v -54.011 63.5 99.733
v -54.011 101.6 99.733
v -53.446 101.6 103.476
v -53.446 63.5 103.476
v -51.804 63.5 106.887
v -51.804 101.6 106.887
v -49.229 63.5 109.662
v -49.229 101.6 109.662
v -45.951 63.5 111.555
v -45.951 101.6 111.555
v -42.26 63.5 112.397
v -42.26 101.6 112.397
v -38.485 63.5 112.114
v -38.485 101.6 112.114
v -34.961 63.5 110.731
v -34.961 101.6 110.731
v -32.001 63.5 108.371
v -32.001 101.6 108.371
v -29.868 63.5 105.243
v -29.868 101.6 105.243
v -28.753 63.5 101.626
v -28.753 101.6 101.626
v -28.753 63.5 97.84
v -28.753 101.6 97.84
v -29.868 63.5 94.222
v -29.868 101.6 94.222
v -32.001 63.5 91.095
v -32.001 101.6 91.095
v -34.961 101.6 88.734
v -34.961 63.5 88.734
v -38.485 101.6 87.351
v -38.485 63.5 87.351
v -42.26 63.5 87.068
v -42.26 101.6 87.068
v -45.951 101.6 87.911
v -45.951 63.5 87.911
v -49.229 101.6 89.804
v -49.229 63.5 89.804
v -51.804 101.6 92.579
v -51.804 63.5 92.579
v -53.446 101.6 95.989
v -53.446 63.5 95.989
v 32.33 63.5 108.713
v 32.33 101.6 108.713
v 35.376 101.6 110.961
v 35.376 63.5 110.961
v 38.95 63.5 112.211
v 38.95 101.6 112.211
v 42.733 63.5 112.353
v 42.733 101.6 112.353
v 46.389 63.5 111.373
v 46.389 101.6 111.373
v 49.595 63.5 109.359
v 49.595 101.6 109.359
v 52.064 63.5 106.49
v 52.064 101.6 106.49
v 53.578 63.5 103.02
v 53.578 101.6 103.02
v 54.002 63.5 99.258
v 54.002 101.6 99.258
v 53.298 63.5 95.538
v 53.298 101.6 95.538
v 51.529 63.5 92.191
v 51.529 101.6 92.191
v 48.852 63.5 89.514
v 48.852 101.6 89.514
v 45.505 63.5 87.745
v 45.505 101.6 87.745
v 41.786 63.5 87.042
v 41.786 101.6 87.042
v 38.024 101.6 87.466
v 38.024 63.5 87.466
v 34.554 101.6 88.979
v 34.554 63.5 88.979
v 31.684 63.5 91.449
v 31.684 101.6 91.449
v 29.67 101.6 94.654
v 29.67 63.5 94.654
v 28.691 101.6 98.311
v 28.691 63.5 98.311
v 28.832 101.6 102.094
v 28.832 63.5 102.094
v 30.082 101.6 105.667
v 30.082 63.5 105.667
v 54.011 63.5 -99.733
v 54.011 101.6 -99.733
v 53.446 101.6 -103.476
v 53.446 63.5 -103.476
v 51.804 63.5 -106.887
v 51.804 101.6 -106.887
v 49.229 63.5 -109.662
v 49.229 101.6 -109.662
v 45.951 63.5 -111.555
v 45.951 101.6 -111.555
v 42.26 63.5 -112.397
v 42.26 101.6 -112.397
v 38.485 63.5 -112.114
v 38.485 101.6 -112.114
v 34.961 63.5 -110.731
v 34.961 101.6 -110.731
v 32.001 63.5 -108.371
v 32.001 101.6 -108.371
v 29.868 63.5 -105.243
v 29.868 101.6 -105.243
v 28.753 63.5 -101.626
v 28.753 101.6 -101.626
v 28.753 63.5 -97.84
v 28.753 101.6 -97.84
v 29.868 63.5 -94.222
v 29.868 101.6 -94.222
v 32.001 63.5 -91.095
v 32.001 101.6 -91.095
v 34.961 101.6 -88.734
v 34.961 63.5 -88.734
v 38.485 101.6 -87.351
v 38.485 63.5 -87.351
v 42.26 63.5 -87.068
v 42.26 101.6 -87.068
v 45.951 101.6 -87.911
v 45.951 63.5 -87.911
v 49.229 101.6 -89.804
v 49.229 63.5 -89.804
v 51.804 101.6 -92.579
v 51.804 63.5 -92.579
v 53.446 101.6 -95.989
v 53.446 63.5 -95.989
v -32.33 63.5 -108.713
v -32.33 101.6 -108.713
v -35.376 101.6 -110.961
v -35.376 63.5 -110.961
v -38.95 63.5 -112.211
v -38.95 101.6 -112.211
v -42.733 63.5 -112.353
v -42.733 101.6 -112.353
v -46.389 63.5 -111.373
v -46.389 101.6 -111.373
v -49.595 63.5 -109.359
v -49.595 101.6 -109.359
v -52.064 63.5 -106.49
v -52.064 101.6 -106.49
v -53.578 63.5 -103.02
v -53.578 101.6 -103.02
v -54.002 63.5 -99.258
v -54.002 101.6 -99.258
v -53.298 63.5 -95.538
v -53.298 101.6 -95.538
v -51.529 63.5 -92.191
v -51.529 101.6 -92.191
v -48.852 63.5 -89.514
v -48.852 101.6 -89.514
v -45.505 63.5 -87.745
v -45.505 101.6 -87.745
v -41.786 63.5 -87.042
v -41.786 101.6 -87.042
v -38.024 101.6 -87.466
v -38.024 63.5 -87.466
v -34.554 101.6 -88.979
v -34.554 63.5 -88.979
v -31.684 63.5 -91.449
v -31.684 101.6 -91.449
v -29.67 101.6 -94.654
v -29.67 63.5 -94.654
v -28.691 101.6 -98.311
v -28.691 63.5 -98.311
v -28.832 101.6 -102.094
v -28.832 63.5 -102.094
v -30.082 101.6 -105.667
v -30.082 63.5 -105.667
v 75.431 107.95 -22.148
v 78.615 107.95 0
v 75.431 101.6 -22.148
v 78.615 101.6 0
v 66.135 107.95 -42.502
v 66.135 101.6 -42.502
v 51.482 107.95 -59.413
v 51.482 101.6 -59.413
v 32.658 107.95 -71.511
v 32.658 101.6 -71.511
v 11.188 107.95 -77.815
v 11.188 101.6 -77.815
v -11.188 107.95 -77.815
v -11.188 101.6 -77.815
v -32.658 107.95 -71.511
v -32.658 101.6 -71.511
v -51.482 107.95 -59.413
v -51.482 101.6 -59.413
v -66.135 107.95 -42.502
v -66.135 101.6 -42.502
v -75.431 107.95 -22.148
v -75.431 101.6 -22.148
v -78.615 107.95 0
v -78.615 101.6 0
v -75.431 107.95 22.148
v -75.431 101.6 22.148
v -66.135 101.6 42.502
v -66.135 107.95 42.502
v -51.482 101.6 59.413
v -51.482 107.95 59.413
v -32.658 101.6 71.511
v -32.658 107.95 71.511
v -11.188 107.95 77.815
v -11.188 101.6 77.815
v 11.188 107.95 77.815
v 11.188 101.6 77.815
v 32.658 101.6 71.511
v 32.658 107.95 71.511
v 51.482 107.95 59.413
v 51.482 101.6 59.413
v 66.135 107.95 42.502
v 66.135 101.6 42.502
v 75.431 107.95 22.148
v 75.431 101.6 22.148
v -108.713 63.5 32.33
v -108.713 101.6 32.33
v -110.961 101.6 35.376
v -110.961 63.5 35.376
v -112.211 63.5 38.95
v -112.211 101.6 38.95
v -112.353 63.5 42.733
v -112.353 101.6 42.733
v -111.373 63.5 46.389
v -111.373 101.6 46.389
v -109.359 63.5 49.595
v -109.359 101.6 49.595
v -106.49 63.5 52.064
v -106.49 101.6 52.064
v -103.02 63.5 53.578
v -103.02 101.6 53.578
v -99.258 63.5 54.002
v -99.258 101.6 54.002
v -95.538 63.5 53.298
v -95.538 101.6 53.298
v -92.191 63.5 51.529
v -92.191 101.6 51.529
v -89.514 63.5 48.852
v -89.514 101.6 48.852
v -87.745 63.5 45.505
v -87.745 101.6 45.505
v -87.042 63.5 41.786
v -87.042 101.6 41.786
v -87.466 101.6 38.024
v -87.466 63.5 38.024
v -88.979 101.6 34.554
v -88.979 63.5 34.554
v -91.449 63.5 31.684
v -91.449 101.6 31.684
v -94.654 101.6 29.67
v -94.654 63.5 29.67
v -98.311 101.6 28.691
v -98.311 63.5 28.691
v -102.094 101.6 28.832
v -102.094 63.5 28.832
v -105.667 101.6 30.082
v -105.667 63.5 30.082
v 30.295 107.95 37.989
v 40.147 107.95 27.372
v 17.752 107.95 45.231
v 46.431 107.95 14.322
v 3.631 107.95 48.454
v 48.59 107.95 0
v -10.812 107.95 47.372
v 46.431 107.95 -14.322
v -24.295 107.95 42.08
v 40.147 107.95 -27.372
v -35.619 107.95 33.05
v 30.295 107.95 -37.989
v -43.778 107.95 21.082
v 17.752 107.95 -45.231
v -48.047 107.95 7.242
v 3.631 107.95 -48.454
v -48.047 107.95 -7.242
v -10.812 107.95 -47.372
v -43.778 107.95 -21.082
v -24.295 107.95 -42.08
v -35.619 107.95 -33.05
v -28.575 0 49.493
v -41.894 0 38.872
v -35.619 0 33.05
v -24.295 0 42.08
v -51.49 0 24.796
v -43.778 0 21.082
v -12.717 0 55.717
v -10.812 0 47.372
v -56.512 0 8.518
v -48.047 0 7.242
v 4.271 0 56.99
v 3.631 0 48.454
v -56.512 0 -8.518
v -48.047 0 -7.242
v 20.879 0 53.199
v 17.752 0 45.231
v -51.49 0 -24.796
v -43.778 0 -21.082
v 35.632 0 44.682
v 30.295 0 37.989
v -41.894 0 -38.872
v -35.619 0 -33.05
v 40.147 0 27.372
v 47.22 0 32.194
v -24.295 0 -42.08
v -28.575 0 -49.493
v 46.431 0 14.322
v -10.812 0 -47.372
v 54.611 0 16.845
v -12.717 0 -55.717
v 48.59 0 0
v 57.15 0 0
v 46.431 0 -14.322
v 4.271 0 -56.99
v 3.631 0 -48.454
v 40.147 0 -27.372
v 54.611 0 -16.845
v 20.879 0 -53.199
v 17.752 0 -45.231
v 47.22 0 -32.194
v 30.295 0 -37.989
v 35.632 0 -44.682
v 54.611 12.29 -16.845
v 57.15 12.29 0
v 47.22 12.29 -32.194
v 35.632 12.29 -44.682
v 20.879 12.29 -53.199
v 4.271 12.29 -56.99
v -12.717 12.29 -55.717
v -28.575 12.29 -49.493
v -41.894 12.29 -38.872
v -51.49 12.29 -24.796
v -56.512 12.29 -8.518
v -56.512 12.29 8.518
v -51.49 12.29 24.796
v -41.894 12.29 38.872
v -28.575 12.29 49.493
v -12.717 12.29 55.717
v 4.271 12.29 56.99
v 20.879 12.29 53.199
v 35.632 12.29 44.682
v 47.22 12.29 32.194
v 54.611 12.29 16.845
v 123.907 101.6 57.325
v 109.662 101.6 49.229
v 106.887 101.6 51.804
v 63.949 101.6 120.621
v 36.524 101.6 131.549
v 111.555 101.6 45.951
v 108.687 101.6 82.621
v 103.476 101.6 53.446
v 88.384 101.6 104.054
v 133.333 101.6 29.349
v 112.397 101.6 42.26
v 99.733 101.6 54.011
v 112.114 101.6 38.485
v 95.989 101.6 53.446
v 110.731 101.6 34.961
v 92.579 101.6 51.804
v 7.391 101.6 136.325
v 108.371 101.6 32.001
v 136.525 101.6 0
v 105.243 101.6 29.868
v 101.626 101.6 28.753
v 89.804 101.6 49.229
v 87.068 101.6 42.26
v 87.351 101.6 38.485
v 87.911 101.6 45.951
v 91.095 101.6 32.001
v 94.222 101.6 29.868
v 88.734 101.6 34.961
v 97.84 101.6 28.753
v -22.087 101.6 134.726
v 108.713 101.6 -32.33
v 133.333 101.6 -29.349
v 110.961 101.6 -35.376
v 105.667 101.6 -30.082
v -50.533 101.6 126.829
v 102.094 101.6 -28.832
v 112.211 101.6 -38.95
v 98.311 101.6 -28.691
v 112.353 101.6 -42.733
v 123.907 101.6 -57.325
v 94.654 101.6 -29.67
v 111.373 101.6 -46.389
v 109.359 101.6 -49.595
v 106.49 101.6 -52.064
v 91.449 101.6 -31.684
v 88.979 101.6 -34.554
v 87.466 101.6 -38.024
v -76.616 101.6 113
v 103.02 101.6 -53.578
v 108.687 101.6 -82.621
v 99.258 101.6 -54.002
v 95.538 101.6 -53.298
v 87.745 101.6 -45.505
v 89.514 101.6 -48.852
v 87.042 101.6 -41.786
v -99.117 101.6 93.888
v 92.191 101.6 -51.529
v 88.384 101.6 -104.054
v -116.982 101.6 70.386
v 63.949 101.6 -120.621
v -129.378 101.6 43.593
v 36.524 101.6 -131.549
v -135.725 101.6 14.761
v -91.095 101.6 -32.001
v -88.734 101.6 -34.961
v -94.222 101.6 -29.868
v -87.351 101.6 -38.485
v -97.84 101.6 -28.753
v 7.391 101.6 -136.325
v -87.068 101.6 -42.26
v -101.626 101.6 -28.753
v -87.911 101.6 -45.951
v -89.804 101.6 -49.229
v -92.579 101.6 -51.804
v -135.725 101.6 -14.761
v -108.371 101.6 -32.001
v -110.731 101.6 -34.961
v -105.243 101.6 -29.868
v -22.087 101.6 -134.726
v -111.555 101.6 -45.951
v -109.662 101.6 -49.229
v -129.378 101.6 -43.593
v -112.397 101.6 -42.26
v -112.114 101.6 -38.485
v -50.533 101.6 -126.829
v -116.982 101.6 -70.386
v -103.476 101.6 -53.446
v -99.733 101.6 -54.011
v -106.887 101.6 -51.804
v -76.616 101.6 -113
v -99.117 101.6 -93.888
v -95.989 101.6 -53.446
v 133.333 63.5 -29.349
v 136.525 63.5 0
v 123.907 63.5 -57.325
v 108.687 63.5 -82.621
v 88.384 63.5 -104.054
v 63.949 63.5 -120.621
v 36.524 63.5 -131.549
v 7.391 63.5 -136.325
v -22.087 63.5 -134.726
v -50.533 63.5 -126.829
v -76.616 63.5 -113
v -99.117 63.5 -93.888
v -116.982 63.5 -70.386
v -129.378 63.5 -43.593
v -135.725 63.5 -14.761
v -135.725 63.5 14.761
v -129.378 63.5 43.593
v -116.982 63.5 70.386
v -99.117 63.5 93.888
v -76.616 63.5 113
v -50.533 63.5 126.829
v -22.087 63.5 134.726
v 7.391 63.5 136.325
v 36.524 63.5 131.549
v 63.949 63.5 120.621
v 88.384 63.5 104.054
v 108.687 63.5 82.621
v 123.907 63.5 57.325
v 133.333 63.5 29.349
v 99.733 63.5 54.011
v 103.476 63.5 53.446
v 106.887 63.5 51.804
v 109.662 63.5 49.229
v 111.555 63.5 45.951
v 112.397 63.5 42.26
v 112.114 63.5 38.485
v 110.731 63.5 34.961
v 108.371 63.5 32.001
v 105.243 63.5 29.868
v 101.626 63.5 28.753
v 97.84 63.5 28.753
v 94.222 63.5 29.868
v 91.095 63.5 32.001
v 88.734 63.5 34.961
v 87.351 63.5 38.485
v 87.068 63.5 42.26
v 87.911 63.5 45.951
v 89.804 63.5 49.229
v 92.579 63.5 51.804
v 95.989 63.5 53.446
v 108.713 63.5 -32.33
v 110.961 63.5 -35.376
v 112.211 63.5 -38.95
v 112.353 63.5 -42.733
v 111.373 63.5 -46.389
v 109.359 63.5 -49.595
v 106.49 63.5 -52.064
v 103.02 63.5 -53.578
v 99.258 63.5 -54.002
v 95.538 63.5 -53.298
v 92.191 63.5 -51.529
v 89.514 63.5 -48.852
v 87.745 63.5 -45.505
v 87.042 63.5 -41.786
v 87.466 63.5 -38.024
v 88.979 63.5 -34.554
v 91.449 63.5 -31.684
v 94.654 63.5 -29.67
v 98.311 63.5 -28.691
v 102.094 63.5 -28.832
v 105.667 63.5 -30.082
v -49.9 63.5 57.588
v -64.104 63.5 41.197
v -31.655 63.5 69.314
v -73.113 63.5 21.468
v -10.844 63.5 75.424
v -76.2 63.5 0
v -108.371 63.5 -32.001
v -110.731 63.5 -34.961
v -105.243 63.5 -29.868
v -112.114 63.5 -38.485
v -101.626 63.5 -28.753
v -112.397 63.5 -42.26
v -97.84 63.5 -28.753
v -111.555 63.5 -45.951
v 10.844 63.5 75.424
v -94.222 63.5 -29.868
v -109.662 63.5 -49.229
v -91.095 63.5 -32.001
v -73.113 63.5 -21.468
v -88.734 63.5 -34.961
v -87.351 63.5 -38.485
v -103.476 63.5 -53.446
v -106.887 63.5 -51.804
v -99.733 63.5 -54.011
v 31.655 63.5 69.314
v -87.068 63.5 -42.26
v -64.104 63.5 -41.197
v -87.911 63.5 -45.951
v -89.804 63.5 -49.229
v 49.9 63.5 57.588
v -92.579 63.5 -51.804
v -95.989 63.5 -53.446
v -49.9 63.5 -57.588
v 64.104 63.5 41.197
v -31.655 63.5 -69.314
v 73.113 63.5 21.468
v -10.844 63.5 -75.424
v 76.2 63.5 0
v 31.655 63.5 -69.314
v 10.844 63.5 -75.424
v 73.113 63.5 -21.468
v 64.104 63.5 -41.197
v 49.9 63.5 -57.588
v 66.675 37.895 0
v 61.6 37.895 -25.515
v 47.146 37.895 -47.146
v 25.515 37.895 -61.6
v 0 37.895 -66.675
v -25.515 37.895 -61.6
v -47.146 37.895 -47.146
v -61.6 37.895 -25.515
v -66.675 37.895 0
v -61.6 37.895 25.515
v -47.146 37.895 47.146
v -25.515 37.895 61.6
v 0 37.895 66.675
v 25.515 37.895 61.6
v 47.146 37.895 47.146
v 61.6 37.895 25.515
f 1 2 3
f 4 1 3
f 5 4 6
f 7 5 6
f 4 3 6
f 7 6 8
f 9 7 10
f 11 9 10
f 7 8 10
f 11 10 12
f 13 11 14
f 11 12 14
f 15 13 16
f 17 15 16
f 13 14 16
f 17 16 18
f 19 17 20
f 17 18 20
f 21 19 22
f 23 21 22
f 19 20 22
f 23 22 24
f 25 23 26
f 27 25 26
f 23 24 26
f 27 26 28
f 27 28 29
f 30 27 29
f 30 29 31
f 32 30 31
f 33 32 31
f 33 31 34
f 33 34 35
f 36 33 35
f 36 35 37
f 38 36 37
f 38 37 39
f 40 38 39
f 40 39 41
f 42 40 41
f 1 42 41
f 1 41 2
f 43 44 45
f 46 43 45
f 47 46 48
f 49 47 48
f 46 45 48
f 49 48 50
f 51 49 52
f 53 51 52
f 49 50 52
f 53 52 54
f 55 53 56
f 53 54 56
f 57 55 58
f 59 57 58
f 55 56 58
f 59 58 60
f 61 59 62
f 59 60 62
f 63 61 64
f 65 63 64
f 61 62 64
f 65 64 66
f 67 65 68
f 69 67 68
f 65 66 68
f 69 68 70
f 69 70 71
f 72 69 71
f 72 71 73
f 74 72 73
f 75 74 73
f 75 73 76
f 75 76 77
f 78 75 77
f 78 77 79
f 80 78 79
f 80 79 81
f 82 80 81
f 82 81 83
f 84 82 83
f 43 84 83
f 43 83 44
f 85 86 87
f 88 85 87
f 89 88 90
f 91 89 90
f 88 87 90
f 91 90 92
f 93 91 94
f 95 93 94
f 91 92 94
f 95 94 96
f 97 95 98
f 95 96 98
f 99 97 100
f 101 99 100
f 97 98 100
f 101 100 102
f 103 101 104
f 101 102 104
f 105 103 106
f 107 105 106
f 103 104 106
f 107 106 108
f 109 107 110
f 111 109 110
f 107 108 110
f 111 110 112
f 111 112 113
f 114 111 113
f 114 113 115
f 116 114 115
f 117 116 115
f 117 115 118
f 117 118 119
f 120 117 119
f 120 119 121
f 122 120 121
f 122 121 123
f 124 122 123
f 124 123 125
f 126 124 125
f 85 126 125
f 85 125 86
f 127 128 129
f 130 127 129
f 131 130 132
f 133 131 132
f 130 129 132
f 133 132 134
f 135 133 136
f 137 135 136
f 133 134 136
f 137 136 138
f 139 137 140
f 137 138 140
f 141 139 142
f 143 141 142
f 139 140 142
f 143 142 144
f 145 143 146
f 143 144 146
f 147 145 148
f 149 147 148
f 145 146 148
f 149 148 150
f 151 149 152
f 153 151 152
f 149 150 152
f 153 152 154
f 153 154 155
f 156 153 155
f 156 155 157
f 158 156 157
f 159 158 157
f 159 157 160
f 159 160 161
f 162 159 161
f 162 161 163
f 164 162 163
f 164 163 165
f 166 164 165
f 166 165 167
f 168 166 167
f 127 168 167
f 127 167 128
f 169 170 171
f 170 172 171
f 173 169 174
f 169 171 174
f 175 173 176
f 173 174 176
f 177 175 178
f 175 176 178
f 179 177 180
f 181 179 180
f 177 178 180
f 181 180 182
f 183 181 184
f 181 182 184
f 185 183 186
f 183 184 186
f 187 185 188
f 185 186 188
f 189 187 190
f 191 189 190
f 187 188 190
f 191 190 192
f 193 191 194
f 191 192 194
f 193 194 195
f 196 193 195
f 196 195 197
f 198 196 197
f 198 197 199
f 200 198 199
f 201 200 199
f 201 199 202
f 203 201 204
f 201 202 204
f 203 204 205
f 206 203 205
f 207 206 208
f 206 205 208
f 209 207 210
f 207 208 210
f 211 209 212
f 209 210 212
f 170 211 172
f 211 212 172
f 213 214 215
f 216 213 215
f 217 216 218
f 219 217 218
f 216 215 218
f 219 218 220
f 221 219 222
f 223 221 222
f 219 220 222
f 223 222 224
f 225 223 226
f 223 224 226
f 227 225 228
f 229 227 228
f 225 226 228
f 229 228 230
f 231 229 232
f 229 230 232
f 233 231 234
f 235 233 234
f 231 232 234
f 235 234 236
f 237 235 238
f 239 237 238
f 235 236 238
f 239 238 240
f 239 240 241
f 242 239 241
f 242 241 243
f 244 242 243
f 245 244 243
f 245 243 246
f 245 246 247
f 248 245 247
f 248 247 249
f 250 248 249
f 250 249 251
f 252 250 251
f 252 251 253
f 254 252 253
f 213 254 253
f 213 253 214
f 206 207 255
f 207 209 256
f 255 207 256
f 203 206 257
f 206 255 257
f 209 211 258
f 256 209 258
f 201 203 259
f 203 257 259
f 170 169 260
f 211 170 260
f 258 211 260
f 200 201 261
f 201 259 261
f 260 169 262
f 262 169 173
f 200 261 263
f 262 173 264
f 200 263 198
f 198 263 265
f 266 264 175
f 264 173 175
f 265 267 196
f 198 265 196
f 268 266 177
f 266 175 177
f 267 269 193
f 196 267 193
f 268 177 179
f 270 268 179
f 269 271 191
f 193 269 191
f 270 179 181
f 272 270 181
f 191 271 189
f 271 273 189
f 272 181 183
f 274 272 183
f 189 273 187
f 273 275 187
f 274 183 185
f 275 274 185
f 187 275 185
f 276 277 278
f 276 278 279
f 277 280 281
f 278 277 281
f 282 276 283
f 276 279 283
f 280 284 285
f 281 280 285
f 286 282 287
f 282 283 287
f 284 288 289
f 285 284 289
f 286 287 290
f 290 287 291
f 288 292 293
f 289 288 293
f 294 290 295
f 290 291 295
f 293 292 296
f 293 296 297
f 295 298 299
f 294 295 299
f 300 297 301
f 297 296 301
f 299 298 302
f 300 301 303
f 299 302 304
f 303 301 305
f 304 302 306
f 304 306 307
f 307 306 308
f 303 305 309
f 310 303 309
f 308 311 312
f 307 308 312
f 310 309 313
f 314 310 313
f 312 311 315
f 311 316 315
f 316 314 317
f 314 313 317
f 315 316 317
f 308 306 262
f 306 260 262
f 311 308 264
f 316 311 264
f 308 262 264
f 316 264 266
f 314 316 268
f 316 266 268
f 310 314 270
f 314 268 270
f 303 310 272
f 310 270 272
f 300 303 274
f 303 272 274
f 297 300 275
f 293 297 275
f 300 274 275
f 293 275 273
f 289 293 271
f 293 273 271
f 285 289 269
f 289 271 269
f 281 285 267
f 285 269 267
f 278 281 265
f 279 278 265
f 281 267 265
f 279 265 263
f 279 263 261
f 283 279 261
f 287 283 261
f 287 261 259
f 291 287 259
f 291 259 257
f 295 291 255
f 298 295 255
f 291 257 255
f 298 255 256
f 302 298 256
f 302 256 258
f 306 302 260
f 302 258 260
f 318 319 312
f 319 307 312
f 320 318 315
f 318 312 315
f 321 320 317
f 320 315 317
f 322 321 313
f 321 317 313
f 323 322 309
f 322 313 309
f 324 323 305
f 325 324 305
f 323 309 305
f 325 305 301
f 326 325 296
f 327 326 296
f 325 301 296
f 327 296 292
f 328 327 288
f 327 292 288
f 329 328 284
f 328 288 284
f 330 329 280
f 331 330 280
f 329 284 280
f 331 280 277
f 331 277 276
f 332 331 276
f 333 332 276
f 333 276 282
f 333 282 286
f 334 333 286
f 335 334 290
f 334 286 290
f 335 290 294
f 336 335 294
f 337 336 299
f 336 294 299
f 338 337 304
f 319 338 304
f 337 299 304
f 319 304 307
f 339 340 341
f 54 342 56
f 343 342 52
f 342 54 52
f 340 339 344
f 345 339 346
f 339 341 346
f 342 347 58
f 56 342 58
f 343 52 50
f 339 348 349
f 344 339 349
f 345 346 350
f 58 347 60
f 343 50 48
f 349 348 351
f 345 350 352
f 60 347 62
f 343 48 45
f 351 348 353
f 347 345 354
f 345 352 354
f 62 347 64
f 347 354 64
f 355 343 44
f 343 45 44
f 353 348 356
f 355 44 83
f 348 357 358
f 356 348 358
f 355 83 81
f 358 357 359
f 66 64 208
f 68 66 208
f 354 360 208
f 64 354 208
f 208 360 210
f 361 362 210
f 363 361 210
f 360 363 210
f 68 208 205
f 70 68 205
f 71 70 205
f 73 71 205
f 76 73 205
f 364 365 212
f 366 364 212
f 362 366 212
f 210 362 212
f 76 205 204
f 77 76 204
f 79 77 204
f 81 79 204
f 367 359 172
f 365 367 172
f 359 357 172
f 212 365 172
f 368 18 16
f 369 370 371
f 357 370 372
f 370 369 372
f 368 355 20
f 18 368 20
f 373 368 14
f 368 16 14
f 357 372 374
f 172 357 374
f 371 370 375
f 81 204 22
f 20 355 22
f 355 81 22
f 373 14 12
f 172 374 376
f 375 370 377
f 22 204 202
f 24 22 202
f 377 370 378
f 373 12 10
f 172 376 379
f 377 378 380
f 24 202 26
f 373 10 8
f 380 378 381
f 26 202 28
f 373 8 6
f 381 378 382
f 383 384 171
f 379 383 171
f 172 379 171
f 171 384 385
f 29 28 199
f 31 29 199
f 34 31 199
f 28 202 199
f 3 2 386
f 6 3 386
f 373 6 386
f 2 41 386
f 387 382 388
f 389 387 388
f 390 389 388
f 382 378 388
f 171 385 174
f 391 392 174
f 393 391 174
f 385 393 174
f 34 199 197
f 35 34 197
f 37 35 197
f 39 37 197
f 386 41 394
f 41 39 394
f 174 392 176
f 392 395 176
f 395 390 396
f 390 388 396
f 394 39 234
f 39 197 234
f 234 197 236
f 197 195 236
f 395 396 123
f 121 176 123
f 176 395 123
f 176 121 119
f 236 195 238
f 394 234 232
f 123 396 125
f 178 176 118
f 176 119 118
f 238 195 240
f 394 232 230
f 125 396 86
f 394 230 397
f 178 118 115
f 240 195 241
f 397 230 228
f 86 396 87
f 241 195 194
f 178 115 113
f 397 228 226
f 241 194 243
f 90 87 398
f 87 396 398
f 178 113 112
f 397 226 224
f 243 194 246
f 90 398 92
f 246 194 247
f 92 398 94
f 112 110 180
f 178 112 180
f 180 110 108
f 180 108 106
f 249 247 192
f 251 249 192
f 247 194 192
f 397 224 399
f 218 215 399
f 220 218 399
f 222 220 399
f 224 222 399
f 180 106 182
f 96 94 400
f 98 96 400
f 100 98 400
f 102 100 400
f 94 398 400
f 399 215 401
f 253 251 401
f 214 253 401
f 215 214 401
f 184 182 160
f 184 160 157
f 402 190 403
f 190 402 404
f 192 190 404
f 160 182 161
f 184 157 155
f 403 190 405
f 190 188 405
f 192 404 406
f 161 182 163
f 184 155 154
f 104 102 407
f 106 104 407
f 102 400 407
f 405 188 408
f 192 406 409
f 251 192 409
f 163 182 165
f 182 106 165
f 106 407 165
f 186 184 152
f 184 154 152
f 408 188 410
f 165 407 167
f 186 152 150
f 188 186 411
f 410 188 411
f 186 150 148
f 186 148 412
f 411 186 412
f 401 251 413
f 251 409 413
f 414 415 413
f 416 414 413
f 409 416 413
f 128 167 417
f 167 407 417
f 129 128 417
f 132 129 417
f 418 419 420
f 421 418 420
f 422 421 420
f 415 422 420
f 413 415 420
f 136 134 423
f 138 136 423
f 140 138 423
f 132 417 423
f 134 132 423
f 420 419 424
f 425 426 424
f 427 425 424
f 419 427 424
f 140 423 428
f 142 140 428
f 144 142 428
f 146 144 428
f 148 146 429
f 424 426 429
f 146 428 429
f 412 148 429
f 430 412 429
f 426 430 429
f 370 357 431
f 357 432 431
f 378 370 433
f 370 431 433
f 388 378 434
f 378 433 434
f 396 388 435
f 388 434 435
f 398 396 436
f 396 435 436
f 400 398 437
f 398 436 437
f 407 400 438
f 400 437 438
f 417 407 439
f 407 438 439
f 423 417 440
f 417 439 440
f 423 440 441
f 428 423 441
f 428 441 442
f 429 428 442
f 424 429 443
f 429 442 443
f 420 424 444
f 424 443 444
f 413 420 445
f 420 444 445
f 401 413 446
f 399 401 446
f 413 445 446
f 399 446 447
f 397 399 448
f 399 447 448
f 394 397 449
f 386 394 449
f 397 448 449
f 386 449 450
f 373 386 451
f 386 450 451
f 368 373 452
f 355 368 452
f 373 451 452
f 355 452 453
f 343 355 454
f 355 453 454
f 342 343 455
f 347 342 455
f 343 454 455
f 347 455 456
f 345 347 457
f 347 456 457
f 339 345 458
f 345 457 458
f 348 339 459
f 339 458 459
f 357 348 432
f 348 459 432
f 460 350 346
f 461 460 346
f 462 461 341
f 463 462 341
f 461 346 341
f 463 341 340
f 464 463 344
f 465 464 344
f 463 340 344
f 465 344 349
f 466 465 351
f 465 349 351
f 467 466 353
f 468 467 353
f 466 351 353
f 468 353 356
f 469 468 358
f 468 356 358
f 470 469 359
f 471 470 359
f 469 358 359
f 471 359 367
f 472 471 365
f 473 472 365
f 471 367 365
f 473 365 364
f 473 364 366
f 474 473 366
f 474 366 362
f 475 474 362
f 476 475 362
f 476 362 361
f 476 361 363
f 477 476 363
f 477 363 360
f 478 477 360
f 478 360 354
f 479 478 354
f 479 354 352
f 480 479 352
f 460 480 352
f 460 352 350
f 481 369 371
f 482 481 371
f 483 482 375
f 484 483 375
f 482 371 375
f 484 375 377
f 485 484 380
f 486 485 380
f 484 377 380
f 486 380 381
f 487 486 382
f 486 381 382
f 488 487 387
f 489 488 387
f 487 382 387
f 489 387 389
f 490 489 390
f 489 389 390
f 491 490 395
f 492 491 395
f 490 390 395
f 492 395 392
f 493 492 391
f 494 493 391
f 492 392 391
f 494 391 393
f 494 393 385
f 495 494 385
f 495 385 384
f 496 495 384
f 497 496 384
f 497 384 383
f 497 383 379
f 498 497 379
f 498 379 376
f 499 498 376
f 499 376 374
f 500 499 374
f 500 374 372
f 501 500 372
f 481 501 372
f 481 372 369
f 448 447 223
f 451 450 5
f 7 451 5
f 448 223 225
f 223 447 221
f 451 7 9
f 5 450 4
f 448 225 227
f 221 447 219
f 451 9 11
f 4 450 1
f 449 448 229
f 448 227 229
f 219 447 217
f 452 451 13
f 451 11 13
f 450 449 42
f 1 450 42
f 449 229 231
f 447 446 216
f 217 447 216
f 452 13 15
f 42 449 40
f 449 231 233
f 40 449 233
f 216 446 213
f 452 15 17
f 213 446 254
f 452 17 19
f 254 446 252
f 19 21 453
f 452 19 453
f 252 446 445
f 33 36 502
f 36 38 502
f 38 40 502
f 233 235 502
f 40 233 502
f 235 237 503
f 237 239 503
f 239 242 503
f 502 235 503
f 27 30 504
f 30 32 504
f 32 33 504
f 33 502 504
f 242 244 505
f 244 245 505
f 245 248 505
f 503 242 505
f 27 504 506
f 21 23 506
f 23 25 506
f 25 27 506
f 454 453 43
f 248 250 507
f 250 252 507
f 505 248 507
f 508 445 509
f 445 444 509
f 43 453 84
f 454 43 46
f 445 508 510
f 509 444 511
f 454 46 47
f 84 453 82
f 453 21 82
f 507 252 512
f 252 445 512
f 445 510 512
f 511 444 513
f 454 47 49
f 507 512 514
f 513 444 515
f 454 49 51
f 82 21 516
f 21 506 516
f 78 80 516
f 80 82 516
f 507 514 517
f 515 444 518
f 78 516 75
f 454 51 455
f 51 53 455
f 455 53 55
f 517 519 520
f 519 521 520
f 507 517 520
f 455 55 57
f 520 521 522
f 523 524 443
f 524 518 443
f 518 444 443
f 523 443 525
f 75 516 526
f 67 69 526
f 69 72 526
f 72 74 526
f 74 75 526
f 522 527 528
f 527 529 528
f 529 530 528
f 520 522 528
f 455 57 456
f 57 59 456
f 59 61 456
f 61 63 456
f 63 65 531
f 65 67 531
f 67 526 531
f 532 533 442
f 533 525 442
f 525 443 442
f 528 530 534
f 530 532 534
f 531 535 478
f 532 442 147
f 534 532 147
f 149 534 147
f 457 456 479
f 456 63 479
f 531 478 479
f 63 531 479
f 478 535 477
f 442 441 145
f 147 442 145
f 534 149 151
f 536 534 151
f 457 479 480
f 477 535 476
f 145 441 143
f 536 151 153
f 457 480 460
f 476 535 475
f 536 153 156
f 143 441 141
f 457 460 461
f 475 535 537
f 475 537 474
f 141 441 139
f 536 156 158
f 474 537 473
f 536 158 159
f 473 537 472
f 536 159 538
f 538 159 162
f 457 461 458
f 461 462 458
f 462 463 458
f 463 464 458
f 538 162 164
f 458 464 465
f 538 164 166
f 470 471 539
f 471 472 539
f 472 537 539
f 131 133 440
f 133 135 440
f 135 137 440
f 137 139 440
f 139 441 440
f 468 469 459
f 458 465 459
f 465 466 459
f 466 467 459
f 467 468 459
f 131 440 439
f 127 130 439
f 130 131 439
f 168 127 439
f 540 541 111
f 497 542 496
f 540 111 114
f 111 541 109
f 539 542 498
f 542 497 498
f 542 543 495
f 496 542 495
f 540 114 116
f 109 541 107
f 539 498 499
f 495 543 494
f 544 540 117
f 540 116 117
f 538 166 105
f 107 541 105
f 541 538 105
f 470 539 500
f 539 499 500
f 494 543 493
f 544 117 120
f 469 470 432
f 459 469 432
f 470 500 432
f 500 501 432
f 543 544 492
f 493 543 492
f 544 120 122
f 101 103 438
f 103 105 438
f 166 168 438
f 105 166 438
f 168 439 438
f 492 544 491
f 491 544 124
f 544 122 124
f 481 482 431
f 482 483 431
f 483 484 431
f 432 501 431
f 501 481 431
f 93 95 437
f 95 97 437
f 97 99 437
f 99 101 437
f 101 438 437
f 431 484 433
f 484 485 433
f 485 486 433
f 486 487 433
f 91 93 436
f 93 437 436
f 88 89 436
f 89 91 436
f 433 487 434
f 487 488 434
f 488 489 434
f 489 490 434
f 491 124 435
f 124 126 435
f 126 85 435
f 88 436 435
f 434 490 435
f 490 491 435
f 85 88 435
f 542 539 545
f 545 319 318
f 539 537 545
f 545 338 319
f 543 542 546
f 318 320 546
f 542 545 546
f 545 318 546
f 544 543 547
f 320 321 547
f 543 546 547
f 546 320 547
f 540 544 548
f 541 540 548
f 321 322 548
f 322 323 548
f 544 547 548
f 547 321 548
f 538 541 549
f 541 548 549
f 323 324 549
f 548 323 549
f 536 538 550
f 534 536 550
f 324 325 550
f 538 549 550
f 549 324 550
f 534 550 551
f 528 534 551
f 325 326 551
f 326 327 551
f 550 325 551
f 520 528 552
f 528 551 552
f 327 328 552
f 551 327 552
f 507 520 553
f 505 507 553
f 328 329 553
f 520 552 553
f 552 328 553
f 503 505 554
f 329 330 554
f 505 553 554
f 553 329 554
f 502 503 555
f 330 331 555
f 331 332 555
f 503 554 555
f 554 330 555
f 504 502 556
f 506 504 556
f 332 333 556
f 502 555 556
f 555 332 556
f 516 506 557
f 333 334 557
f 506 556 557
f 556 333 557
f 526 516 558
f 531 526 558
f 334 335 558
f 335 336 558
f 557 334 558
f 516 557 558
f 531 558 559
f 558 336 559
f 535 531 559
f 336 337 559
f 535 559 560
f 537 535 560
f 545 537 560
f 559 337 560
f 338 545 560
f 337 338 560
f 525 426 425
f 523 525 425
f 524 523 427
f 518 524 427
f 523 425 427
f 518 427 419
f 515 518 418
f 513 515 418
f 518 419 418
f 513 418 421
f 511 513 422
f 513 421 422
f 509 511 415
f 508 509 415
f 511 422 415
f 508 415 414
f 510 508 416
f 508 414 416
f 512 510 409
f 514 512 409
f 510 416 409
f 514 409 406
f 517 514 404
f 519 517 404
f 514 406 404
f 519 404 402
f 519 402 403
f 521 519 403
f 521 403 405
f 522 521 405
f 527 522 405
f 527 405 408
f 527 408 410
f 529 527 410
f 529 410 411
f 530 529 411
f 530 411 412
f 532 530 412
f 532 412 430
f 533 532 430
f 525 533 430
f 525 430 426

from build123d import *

# Parameters (mm, degrees)
ESBO_O2_R             = 12.7
CORTE_EXTRUS_O1_DEPTH = 102.6
PADR_OCIRCULAR1_COUNT = 8


with BuildPart() as part:
    # Esboço1 → Revolução1 (revolve)
    with BuildSketch(Plane.XY):
        Polygon((48.59, 0), (48.59, 107.95), (78.615, 107.95), (78.615, 101.6), (136.525, 101.6), (136.525, 63.5), (76.2, 63.5), (57.15, 12.29), (57.15, 0), align=None)
    revolve(axis=Axis((0, 0, 0), (0, 1, 0)))

    # Esboço2 → Corte-extrusão1 (cut, through all)
    with BuildSketch(Plane(origin=(0, 101.6, 0), x_dir=(1, 0, 0), z_dir=(0, 1, 0))):
        with Locations((41.310676524, 99.732795535)):
            Circle(ESBO_O2_R)
    corte_extrus_o1 = extrude(amount=-CORTE_EXTRUS_O1_DEPTH, mode=Mode.SUBTRACT)

    # PadrãoCircular1: Corte-extrusão1 ×8 about axis
    padr_ocircular1_axis = Axis((0, 0, 0), (0, 1, 0))
    for i in range(1, PADR_OCIRCULAR1_COUNT):
        add(corte_extrus_o1.rotate(padr_ocircular1_axis, i * 360 / PADR_OCIRCULAR1_COUNT), mode=Mode.SUBTRACT)


solid = part.part
